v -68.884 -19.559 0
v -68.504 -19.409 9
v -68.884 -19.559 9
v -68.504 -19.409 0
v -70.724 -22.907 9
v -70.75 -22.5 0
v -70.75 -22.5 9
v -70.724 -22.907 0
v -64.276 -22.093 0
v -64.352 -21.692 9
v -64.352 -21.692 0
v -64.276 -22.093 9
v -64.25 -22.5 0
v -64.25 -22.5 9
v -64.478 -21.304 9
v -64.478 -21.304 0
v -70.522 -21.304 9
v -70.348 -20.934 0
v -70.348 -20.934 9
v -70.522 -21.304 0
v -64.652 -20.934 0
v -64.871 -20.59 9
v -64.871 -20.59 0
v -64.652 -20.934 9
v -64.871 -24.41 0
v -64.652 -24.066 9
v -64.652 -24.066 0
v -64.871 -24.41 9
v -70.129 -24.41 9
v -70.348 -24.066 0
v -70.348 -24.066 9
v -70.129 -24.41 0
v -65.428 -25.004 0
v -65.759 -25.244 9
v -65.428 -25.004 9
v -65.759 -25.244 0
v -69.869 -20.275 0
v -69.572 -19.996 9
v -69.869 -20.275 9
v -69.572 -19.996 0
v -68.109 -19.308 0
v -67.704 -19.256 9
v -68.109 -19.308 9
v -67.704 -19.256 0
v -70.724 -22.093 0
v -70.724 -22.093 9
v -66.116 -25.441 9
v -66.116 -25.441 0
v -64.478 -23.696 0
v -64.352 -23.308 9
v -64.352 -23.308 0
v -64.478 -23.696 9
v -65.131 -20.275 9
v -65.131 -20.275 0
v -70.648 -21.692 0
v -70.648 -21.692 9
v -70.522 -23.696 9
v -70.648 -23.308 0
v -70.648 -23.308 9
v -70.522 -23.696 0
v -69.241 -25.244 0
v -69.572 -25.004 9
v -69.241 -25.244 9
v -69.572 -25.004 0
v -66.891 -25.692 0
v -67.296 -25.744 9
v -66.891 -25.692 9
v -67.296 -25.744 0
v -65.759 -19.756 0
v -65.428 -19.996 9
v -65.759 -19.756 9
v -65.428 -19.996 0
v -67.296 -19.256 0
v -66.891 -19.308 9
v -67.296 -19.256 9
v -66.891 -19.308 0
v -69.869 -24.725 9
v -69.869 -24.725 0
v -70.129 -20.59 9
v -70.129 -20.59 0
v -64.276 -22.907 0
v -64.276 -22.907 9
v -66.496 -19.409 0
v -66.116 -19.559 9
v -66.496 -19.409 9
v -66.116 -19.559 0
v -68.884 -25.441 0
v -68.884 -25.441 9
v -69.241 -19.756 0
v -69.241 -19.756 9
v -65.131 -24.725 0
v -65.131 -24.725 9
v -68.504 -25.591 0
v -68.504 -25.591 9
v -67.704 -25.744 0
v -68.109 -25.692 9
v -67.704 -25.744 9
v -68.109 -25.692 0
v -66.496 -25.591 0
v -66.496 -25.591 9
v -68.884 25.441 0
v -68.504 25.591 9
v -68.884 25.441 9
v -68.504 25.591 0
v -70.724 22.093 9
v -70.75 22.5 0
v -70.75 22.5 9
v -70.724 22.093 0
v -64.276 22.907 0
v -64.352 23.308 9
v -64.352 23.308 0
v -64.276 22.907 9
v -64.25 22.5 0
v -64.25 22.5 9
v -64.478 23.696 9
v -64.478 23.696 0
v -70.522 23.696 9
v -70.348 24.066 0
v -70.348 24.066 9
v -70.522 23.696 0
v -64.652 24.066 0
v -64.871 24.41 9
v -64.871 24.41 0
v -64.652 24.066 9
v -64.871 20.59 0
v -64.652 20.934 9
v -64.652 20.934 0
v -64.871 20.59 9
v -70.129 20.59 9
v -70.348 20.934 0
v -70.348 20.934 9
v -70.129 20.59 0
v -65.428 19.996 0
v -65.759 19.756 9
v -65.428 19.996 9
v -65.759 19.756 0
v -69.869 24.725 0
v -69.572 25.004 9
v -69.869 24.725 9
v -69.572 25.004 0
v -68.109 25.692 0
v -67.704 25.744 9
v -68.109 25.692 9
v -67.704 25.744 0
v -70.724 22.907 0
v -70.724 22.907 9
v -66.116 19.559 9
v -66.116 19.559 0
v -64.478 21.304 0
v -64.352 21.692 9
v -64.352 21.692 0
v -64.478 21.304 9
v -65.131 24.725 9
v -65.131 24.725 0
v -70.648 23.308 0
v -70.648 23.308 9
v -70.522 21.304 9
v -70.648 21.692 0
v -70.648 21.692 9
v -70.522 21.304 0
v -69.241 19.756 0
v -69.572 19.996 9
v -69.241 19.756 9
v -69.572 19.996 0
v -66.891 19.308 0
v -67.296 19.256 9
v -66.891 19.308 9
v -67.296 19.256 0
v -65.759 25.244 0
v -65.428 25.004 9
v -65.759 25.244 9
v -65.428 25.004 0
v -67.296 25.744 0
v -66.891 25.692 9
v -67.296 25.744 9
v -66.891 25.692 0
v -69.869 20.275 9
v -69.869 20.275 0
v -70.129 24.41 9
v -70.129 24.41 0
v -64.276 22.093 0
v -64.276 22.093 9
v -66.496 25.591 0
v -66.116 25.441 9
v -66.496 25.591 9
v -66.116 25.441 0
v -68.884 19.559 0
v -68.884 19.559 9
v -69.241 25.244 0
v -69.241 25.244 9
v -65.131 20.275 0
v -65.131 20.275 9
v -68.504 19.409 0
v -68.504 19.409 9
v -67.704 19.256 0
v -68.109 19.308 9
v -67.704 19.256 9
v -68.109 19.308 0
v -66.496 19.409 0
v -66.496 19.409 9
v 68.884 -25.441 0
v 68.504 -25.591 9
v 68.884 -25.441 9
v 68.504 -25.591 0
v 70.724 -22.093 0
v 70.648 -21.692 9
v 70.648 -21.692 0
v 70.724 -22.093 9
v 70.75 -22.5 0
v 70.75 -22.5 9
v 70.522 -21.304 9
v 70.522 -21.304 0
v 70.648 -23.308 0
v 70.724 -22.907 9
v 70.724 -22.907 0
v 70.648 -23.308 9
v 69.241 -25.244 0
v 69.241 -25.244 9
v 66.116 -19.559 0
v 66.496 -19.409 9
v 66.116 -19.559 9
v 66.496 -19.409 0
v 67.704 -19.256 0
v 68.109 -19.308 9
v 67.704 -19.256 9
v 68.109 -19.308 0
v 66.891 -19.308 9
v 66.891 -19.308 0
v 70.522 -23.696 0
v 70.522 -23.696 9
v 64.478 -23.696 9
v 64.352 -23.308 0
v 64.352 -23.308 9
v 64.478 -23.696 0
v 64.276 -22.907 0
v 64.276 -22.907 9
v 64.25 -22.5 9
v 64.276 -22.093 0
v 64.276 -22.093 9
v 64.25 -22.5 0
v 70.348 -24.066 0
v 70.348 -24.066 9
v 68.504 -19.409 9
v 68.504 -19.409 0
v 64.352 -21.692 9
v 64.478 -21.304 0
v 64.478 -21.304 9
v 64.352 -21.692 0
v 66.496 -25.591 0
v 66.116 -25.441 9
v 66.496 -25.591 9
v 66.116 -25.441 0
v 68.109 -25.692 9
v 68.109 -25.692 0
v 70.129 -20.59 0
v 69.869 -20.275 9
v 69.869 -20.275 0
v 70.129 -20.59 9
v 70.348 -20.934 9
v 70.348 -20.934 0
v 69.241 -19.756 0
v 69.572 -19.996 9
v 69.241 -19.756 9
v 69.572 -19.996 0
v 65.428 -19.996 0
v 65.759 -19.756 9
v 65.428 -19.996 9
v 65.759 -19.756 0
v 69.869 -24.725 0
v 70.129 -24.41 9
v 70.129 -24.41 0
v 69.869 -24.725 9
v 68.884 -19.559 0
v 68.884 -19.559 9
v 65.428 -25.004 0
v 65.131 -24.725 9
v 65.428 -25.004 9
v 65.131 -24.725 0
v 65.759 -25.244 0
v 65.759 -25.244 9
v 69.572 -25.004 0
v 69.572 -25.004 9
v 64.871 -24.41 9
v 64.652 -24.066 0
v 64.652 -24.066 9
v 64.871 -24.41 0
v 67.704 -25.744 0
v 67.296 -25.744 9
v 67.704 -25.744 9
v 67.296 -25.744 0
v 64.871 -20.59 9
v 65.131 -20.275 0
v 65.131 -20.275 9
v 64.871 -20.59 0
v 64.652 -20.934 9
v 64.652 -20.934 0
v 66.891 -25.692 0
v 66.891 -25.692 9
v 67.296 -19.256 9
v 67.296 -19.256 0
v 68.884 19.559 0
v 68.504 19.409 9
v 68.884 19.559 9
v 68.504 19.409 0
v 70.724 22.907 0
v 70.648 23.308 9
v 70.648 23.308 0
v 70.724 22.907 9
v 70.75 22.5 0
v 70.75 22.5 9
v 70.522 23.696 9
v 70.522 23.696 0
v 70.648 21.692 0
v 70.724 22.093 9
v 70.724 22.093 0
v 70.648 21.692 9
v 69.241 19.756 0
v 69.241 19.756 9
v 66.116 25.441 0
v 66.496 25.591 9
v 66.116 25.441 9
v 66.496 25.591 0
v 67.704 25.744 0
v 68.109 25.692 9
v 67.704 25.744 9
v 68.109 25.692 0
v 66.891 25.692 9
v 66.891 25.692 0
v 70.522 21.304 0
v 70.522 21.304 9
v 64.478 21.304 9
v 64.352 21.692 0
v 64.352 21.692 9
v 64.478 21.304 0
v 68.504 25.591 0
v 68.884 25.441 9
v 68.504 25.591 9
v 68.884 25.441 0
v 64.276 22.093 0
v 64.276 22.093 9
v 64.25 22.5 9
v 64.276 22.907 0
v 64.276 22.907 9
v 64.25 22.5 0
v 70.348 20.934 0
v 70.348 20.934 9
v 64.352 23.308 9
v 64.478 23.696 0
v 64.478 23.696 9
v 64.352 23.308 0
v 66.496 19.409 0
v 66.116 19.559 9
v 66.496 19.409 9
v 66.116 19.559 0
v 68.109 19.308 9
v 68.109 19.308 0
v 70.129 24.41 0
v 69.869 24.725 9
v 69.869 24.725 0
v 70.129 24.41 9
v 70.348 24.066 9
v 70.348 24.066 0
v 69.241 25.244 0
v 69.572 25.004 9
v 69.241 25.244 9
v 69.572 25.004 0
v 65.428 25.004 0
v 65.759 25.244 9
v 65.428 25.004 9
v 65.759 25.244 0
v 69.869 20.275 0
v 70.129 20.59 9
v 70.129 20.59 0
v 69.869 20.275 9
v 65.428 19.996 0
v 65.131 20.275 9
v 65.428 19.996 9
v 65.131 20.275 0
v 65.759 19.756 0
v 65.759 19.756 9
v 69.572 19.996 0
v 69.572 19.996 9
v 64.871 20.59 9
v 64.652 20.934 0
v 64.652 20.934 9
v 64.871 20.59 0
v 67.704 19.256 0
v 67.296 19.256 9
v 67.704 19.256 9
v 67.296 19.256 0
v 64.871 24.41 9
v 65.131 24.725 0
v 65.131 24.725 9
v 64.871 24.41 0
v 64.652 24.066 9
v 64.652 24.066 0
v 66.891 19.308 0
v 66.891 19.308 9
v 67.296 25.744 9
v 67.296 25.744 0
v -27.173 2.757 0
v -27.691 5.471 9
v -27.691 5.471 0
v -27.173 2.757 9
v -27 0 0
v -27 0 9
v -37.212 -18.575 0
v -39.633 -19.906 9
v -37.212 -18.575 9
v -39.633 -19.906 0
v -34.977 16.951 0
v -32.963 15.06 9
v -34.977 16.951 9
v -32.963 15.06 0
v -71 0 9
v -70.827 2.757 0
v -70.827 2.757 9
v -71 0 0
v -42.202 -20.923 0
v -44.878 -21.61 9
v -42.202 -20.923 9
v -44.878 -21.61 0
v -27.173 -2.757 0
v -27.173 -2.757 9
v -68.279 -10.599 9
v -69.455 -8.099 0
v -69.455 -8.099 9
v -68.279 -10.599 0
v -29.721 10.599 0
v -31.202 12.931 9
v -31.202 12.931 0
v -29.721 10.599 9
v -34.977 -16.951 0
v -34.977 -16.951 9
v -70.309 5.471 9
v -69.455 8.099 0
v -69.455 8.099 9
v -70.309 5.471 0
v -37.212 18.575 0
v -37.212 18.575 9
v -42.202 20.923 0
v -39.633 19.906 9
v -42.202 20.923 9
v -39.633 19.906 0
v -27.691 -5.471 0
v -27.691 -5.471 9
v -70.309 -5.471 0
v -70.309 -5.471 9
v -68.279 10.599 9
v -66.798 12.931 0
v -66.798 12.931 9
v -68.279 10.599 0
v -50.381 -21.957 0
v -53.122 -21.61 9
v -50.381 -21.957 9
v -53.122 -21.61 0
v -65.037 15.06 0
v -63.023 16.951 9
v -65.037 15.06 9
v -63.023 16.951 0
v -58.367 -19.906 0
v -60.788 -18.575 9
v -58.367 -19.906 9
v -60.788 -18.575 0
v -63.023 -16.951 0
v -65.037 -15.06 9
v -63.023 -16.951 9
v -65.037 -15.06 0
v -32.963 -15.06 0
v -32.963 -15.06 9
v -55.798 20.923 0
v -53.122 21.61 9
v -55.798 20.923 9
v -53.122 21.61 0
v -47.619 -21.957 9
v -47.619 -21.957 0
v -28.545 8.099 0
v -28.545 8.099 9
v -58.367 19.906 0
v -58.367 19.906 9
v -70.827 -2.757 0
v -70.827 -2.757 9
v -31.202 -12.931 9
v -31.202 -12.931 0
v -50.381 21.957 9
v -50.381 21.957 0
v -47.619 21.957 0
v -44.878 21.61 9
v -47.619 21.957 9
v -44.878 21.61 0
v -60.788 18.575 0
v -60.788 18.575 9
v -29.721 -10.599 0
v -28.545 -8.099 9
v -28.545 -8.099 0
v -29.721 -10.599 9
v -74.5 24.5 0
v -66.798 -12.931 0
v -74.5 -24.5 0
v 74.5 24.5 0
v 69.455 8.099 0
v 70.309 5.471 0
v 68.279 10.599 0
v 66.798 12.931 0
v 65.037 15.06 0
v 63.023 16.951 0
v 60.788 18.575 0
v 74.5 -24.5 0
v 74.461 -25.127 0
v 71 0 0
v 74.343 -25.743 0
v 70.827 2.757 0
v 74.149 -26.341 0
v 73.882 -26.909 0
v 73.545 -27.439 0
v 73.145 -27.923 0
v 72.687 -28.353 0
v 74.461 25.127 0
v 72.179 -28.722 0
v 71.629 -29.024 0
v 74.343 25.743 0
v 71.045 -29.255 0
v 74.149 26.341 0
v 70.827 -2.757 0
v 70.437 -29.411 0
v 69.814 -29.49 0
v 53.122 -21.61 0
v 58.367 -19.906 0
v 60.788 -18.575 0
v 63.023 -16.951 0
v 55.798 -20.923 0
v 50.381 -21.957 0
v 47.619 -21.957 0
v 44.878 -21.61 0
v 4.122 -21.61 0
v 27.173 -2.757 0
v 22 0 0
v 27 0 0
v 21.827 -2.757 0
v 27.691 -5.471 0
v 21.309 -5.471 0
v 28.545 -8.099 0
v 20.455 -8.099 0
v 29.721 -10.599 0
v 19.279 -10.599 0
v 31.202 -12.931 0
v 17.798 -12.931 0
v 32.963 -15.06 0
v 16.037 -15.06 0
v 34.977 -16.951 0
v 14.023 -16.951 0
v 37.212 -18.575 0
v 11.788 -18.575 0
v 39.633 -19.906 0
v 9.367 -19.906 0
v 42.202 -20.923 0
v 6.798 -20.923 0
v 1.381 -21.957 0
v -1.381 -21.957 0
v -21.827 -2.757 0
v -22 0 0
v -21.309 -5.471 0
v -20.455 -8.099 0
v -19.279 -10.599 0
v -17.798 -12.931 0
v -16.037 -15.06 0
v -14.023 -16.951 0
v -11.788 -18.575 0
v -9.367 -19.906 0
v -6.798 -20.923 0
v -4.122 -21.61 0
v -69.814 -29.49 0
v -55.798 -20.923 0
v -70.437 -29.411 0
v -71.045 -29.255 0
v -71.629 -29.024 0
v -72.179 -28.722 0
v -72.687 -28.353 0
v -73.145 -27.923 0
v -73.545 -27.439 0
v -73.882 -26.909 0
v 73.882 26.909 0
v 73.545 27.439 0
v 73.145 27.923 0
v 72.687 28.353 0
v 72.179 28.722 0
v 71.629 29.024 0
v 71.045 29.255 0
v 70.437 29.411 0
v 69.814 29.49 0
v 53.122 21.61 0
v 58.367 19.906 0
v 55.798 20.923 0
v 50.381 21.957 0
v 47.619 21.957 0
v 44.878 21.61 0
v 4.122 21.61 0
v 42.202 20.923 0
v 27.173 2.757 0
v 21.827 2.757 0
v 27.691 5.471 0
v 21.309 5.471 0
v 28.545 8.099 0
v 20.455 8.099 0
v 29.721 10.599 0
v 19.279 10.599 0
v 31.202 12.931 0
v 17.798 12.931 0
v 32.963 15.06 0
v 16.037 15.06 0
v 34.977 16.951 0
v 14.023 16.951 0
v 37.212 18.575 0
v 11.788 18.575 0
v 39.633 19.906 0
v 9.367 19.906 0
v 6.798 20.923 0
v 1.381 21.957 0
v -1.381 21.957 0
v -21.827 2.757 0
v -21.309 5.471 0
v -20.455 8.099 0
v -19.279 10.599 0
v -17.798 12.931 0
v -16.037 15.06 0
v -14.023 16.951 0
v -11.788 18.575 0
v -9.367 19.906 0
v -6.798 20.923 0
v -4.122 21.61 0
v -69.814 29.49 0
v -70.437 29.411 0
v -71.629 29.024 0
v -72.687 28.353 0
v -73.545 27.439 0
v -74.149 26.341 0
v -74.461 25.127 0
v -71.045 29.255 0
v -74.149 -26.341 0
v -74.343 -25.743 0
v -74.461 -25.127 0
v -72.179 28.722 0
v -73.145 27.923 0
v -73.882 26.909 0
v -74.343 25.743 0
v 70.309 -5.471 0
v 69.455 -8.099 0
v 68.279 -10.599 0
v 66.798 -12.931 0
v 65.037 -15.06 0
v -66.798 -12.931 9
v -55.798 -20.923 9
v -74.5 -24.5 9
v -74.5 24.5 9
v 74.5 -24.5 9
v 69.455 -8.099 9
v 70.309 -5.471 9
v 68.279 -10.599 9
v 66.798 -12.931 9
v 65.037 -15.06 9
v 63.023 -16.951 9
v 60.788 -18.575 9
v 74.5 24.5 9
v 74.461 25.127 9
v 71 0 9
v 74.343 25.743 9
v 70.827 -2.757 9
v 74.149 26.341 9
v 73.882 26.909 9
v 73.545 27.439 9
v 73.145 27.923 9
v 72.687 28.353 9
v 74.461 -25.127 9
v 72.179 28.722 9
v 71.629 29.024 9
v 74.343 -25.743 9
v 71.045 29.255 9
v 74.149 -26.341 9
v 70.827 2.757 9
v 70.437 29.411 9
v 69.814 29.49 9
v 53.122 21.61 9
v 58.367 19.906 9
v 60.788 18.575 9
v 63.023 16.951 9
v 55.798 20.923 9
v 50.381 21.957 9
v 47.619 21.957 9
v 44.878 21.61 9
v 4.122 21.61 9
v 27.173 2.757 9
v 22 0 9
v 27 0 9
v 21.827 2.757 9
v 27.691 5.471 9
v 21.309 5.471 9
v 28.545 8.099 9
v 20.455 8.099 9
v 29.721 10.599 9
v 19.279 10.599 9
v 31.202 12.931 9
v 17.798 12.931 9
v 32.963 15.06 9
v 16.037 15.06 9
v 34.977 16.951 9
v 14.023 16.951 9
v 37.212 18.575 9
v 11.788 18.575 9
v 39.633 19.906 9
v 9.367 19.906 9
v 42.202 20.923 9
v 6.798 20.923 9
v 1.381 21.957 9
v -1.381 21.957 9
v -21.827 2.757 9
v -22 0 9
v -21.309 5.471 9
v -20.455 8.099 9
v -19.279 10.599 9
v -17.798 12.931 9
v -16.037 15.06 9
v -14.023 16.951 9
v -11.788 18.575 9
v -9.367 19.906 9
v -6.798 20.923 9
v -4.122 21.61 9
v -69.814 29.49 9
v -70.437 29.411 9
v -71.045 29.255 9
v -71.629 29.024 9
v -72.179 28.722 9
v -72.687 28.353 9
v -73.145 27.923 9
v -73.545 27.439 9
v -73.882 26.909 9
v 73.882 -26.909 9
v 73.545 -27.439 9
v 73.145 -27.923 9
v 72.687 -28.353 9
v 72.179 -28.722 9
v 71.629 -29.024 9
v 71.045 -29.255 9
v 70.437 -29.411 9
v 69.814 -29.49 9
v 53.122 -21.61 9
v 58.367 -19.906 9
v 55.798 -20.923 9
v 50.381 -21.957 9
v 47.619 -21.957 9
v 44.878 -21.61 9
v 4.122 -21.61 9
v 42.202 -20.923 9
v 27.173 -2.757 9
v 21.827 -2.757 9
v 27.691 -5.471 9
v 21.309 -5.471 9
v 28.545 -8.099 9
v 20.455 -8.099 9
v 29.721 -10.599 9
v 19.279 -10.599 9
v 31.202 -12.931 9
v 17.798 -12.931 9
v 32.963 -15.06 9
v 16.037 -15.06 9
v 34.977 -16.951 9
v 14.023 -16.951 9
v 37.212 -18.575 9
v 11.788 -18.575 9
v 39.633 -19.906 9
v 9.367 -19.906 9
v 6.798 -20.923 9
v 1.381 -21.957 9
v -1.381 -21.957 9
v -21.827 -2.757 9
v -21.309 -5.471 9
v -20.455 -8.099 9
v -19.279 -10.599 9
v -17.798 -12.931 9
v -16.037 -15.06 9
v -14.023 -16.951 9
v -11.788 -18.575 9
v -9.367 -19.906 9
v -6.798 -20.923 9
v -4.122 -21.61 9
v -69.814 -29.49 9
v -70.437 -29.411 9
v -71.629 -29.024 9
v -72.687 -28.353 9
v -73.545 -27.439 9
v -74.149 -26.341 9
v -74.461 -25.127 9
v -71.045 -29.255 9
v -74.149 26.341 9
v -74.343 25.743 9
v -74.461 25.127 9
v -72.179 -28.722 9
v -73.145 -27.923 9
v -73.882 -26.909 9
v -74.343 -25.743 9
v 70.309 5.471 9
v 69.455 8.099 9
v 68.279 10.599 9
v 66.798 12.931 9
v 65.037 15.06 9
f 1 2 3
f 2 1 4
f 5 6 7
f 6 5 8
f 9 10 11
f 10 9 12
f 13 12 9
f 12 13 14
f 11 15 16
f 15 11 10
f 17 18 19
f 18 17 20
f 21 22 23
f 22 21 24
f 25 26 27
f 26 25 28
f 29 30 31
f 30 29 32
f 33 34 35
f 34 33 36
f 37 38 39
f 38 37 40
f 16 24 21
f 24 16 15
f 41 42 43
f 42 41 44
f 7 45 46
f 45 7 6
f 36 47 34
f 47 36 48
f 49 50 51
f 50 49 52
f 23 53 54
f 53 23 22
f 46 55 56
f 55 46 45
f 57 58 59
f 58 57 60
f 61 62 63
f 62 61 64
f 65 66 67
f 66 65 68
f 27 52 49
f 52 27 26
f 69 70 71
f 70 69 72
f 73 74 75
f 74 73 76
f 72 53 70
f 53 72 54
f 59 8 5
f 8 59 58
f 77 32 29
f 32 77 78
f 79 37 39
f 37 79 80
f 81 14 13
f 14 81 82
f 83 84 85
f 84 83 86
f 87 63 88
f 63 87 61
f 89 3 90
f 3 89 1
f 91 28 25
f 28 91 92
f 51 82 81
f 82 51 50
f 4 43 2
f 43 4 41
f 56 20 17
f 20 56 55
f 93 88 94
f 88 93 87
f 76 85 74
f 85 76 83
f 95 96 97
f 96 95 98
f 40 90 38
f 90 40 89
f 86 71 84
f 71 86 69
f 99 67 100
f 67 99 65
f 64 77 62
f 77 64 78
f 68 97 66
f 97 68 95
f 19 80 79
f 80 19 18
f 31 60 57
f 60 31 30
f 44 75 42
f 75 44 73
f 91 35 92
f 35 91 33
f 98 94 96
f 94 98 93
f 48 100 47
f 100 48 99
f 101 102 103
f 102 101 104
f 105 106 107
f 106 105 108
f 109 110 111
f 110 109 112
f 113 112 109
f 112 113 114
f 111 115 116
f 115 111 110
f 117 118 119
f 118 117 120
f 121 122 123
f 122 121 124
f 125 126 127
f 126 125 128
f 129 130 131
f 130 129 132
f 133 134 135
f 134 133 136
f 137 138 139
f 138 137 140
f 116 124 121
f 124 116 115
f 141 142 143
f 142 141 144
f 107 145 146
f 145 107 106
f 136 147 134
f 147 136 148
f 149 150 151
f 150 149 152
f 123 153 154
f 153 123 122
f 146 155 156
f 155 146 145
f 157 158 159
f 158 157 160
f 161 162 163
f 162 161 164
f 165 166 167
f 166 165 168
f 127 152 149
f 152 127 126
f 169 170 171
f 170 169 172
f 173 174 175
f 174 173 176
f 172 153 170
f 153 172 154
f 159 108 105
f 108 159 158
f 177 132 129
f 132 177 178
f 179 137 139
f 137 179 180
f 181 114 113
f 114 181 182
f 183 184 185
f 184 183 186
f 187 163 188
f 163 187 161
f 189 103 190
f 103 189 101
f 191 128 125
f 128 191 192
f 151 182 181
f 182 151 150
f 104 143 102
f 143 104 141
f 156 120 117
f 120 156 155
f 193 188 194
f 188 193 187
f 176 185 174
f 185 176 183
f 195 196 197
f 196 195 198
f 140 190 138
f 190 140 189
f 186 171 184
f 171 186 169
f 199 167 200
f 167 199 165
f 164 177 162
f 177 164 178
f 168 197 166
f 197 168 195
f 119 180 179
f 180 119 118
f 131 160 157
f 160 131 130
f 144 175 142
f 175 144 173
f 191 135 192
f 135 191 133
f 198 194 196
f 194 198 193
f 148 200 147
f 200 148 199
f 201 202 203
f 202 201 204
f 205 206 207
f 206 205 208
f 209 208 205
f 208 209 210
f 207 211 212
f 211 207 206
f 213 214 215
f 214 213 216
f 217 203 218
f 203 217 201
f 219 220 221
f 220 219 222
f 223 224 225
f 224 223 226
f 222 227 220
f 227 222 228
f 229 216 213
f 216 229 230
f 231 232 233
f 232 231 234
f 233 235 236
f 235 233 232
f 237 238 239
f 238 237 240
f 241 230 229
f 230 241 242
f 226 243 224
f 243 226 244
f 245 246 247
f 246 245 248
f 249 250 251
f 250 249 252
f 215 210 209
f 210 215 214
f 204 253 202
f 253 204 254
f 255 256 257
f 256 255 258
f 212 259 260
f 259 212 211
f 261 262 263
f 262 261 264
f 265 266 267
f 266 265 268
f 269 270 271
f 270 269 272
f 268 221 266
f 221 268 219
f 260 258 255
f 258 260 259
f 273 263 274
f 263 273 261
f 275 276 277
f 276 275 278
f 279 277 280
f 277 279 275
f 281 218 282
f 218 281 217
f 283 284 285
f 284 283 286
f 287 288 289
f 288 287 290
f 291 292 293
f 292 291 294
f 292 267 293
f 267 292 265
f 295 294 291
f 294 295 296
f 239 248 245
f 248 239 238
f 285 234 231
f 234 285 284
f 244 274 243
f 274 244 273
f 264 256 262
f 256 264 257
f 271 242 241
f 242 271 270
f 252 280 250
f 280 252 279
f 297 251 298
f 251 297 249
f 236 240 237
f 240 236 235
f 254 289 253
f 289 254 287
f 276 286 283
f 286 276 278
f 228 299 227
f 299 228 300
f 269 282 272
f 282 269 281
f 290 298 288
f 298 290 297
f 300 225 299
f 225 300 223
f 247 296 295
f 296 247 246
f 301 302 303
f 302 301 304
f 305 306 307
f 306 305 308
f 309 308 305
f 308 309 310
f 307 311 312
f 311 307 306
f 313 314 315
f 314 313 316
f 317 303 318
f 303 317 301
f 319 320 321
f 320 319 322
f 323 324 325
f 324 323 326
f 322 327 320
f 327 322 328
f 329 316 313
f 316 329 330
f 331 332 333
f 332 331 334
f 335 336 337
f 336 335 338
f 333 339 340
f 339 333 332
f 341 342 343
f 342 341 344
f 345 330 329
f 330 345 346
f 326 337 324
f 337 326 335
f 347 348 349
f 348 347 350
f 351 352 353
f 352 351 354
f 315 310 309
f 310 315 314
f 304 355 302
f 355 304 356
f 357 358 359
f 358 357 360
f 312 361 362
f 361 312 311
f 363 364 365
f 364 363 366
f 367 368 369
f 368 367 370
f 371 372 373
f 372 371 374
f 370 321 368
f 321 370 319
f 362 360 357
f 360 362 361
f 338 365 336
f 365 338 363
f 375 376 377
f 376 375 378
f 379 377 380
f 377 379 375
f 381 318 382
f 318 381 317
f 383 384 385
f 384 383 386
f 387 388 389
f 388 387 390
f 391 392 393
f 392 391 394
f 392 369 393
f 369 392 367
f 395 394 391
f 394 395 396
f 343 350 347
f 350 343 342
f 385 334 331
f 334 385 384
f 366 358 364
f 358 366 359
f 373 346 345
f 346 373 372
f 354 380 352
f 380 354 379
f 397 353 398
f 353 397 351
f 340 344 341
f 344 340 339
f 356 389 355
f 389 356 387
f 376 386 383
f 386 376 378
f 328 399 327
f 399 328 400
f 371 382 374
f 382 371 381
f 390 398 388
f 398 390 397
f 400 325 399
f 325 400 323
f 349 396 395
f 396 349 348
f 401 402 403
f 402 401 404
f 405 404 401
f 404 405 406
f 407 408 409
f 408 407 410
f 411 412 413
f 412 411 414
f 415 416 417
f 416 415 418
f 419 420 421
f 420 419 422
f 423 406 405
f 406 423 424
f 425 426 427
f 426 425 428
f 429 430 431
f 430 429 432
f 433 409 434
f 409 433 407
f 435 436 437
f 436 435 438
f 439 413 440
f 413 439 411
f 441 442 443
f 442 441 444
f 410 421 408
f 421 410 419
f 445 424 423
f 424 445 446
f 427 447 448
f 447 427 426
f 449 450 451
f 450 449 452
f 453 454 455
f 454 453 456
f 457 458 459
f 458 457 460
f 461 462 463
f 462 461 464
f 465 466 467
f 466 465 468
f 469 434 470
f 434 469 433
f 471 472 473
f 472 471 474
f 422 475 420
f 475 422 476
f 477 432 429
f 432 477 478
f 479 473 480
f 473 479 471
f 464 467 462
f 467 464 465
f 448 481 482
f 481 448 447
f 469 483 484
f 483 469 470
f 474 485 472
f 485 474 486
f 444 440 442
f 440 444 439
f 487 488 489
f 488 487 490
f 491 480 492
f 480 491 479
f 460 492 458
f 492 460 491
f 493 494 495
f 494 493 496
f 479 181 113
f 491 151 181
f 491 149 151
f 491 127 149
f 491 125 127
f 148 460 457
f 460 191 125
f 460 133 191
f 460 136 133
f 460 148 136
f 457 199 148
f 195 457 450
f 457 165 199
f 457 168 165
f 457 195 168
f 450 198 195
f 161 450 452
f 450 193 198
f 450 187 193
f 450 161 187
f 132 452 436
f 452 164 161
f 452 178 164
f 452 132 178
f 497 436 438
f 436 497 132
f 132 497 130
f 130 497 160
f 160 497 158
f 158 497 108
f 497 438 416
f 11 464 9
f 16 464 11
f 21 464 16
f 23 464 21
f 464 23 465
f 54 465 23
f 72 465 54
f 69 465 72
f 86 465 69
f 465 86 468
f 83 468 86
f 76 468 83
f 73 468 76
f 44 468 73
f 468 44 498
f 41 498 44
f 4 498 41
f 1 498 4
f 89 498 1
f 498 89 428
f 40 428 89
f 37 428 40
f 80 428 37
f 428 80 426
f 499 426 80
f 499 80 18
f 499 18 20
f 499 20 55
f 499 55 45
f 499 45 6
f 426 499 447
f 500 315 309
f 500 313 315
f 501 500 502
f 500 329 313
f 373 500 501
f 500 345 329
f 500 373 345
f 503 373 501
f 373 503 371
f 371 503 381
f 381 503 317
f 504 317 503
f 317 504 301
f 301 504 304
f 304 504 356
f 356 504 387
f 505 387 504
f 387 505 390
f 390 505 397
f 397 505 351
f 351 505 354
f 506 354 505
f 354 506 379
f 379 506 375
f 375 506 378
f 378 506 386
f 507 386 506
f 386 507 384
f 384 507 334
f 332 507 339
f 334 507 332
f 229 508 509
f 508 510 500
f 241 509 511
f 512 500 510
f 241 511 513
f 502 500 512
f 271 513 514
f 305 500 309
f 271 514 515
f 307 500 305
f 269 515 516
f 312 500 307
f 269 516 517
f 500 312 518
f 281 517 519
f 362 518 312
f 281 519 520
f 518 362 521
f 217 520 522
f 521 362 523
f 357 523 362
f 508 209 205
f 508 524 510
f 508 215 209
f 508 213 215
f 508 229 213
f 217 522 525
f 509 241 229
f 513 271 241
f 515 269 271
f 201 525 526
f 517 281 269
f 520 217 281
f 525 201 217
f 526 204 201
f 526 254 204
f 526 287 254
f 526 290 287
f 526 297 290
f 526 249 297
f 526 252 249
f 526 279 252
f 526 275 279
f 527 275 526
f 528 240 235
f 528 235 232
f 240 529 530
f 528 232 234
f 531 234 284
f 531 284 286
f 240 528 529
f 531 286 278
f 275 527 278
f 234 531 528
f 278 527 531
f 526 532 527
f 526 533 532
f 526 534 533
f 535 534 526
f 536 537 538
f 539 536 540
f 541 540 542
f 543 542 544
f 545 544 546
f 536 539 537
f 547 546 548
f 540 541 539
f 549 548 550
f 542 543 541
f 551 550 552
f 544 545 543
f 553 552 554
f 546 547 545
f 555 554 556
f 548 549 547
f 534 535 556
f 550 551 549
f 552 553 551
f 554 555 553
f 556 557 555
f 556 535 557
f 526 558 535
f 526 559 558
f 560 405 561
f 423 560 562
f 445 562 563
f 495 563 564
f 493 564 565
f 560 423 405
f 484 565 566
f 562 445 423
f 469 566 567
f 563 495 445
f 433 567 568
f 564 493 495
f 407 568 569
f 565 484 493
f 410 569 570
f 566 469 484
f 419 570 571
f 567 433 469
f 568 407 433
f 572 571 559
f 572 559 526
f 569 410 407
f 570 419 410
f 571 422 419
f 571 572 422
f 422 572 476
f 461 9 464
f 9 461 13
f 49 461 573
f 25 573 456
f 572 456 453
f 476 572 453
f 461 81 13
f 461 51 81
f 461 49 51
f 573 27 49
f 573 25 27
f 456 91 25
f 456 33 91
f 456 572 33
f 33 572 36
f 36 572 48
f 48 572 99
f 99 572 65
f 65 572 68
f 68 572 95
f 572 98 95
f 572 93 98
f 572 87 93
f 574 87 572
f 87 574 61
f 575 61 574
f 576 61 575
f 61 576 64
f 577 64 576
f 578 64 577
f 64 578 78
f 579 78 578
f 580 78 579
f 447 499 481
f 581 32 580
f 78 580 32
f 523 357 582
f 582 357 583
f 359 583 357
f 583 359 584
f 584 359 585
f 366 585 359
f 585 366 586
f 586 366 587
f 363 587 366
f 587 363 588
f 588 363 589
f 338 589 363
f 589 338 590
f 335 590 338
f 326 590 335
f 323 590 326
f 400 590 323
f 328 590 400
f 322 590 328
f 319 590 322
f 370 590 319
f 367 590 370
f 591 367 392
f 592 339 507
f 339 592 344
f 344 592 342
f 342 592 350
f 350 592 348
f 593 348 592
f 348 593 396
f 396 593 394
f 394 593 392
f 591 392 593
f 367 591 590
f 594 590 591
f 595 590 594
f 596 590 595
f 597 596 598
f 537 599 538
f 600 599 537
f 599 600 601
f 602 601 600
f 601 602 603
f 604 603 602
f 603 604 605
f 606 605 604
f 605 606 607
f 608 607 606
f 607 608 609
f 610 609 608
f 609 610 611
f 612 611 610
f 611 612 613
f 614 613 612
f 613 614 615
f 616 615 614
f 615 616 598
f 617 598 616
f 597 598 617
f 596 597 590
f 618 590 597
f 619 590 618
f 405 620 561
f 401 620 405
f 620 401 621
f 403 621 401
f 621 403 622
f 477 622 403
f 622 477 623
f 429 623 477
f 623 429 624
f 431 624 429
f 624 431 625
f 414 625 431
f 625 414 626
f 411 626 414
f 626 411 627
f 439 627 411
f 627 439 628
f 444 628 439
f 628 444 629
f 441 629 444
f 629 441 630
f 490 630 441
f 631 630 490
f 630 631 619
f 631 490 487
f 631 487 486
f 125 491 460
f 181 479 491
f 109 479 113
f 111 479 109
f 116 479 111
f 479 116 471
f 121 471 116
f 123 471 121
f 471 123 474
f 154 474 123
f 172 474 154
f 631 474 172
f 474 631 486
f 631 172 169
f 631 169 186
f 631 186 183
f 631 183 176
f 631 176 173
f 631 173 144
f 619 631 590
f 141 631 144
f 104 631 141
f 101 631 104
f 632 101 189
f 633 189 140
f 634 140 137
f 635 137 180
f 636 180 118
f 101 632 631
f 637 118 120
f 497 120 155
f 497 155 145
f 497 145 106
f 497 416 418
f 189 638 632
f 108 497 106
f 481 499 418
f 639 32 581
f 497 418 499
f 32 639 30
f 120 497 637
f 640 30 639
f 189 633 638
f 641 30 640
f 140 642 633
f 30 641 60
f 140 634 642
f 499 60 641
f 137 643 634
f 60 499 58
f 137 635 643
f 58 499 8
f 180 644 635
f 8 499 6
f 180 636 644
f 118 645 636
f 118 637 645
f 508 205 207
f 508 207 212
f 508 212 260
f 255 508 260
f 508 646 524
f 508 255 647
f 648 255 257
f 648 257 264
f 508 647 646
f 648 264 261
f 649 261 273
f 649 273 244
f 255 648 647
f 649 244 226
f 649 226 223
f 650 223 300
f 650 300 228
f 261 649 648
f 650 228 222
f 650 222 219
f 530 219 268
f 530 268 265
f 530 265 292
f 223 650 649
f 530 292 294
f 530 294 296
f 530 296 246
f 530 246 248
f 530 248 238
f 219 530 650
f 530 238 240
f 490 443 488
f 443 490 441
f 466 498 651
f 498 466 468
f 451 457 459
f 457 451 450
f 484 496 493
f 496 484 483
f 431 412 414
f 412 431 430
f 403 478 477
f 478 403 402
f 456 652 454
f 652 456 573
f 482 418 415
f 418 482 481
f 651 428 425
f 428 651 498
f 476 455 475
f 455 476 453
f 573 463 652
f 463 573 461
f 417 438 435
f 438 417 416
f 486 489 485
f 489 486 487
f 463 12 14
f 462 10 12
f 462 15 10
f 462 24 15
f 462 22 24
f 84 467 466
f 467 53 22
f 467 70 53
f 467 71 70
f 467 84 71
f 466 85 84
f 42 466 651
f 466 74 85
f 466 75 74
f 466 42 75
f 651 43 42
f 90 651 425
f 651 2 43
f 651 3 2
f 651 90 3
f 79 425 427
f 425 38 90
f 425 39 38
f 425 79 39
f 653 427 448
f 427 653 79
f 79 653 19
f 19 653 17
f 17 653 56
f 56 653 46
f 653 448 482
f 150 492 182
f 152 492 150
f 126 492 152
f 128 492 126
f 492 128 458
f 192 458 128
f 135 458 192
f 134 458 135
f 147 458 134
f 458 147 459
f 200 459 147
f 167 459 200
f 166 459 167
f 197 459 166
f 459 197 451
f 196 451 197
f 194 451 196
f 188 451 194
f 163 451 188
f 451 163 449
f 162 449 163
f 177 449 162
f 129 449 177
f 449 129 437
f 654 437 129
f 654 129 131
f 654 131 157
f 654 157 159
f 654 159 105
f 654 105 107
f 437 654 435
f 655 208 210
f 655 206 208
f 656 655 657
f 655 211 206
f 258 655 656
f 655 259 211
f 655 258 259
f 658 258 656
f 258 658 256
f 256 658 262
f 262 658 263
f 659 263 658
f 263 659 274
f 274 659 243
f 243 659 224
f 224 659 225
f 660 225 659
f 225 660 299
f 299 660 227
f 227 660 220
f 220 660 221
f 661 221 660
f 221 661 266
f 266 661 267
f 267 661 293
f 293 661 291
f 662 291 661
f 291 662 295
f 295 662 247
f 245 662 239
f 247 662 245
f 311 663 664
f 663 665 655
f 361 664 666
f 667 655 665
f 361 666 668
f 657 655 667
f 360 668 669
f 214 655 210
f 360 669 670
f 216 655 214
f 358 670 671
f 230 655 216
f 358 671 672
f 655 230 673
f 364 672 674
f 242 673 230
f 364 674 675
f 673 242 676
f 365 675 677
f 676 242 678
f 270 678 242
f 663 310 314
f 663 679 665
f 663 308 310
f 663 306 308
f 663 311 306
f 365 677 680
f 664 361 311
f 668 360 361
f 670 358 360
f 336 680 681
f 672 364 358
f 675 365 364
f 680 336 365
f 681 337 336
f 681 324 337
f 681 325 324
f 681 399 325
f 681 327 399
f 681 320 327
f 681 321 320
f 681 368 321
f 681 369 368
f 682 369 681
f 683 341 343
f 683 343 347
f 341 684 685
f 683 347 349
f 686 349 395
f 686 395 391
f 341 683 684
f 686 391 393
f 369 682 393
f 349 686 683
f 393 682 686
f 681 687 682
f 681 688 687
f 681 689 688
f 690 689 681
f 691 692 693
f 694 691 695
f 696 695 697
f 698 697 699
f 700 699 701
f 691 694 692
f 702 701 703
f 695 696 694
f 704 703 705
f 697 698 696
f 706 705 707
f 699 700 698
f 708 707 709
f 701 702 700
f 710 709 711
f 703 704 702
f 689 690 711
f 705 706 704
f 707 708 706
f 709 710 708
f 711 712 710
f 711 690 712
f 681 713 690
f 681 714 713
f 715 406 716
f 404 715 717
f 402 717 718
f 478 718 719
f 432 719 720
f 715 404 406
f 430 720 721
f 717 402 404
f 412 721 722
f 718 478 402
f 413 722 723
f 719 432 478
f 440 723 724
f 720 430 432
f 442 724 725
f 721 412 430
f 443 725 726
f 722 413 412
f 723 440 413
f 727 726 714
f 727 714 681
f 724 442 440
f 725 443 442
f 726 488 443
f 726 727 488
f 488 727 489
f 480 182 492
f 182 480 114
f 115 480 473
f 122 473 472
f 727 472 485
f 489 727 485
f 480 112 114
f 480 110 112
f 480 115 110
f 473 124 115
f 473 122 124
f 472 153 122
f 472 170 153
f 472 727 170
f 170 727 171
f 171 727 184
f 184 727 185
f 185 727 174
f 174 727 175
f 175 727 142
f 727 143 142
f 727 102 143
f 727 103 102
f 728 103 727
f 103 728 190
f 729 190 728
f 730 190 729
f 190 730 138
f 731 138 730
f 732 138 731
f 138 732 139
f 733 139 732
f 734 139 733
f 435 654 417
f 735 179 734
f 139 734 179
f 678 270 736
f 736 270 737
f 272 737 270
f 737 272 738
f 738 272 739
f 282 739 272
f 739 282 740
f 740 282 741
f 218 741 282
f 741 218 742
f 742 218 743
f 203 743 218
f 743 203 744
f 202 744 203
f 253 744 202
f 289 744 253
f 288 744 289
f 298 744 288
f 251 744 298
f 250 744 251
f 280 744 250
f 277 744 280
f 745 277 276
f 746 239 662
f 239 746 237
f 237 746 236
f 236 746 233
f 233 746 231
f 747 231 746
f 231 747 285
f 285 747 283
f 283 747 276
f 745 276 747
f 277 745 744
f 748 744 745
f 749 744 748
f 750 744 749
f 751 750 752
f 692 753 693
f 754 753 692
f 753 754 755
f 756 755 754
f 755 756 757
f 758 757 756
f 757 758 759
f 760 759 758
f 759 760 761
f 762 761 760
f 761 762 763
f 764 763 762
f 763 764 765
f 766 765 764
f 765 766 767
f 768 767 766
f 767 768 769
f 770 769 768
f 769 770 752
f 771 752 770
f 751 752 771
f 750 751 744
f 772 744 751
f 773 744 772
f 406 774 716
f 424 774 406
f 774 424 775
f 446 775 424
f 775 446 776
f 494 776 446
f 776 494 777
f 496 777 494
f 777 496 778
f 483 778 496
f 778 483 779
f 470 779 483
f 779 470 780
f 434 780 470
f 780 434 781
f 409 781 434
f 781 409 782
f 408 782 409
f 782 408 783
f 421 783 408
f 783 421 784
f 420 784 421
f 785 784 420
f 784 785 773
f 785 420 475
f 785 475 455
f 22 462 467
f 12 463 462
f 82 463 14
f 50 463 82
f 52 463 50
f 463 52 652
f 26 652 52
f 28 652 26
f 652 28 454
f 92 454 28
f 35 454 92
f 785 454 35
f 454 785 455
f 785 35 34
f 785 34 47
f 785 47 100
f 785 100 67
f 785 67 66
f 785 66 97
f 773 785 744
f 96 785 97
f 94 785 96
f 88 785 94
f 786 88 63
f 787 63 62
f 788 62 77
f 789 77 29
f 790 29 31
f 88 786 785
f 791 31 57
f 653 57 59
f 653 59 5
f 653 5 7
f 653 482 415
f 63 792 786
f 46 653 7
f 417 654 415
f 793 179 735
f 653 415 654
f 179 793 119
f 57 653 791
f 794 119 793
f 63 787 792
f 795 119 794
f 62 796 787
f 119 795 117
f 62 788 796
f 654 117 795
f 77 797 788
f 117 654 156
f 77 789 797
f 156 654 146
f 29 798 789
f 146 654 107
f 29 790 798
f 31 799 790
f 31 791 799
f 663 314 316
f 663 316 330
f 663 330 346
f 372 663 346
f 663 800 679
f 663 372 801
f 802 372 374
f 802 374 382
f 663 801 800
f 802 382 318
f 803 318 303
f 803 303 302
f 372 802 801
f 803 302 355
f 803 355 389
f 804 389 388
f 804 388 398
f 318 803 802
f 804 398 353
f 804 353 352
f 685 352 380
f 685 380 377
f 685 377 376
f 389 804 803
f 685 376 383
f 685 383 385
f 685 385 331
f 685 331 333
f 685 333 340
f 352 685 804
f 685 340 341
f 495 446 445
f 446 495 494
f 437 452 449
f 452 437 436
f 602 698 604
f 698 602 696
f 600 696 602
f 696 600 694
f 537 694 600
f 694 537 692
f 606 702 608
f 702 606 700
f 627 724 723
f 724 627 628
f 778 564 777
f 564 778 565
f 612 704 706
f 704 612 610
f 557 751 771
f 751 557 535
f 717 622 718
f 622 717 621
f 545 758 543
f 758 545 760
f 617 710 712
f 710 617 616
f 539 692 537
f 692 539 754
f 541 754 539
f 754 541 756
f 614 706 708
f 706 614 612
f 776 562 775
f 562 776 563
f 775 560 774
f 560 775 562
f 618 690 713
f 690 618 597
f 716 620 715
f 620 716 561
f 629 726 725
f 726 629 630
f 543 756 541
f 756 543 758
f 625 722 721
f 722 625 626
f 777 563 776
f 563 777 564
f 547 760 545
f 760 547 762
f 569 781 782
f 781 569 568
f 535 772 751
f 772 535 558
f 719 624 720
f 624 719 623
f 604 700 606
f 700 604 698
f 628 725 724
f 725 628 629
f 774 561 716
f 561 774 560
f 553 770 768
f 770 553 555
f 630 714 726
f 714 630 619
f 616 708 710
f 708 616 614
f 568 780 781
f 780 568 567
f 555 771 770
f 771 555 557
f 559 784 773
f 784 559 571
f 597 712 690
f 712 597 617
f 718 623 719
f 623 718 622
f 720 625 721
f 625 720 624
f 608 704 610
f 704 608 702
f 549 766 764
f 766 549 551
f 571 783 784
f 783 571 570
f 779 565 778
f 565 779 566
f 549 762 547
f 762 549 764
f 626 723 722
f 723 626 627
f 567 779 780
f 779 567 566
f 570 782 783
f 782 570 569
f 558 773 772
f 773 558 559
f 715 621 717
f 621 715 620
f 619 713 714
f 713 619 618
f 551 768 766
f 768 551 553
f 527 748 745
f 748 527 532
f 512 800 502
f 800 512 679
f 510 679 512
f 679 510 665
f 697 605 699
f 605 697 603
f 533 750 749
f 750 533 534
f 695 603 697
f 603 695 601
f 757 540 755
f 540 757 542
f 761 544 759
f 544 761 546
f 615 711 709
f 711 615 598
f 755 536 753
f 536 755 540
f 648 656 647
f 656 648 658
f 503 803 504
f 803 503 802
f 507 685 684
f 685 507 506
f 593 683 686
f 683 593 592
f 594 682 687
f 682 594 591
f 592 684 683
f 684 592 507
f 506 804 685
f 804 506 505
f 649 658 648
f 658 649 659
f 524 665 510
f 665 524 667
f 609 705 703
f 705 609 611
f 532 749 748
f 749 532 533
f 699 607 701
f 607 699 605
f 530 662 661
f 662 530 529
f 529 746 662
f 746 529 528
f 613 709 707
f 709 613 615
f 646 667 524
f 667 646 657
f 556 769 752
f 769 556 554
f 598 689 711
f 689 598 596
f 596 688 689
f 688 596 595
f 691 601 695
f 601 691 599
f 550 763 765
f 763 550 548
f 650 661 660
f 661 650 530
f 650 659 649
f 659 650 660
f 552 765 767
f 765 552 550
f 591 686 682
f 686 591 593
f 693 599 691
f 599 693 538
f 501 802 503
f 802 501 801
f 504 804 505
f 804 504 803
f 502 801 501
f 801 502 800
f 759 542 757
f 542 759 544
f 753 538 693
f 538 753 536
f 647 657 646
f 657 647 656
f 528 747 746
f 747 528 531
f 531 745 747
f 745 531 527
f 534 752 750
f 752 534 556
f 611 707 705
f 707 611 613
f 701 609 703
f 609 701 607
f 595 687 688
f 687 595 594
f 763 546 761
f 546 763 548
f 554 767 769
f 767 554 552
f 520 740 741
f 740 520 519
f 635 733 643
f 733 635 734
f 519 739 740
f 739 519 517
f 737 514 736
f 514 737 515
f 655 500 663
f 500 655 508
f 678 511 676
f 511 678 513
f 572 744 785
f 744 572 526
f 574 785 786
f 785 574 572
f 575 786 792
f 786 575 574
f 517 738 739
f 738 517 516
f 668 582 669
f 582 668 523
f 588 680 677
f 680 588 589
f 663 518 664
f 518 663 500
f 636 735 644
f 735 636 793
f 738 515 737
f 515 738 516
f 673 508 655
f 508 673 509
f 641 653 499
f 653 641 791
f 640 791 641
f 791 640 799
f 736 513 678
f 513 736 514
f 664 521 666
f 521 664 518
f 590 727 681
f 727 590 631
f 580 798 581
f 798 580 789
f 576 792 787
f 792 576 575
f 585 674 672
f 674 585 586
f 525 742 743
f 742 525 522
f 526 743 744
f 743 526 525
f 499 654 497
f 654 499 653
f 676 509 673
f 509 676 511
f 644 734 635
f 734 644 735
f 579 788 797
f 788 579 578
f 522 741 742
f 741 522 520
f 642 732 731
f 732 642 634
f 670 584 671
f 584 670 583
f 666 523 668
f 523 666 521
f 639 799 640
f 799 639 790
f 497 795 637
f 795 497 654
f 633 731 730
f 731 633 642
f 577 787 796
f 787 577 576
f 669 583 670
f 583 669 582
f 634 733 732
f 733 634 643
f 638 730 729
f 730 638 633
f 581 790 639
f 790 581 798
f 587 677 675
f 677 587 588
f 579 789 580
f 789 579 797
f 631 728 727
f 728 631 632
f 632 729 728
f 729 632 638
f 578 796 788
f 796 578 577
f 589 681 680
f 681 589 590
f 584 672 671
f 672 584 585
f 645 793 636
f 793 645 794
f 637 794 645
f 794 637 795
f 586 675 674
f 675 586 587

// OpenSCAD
$fn = 50;


difference() {
	union() {
		hull() {
			translate(v = [-69.5000000000, 24.5000000000, 0]) {
				cylinder(h = 9, r = 5);
			}
			translate(v = [69.5000000000, 24.5000000000, 0]) {
				cylinder(h = 9, r = 5);
			}
			translate(v = [-69.5000000000, -24.5000000000, 0]) {
				cylinder(h = 9, r = 5);
			}
			translate(v = [69.5000000000, -24.5000000000, 0]) {
				cylinder(h = 9, r = 5);
			}
		}
	}
	union() {
		#translate(v = [-67.5000000000, -22.5000000000, -100.0000000000]) {
			cylinder(h = 200, r = 3.2500000000);
		}
		#translate(v = [-67.5000000000, 22.5000000000, -100.0000000000]) {
			cylinder(h = 200, r = 3.2500000000);
		}
		#translate(v = [67.5000000000, -22.5000000000, -100.0000000000]) {
			cylinder(h = 200, r = 3.2500000000);
		}
		#translate(v = [67.5000000000, 22.5000000000, -100.0000000000]) {
			cylinder(h = 200, r = 3.2500000000);
		}
		#translate(v = [-49.0000000000, 0, 0]) {
			cylinder(h = 9, r = 22.0000000000);
		}
		#cylinder(h = 9, r = 22.0000000000);
		#translate(v = [49.0000000000, 0, 0]) {
			cylinder(h = 9, r = 22.0000000000);
		}
	}
}
